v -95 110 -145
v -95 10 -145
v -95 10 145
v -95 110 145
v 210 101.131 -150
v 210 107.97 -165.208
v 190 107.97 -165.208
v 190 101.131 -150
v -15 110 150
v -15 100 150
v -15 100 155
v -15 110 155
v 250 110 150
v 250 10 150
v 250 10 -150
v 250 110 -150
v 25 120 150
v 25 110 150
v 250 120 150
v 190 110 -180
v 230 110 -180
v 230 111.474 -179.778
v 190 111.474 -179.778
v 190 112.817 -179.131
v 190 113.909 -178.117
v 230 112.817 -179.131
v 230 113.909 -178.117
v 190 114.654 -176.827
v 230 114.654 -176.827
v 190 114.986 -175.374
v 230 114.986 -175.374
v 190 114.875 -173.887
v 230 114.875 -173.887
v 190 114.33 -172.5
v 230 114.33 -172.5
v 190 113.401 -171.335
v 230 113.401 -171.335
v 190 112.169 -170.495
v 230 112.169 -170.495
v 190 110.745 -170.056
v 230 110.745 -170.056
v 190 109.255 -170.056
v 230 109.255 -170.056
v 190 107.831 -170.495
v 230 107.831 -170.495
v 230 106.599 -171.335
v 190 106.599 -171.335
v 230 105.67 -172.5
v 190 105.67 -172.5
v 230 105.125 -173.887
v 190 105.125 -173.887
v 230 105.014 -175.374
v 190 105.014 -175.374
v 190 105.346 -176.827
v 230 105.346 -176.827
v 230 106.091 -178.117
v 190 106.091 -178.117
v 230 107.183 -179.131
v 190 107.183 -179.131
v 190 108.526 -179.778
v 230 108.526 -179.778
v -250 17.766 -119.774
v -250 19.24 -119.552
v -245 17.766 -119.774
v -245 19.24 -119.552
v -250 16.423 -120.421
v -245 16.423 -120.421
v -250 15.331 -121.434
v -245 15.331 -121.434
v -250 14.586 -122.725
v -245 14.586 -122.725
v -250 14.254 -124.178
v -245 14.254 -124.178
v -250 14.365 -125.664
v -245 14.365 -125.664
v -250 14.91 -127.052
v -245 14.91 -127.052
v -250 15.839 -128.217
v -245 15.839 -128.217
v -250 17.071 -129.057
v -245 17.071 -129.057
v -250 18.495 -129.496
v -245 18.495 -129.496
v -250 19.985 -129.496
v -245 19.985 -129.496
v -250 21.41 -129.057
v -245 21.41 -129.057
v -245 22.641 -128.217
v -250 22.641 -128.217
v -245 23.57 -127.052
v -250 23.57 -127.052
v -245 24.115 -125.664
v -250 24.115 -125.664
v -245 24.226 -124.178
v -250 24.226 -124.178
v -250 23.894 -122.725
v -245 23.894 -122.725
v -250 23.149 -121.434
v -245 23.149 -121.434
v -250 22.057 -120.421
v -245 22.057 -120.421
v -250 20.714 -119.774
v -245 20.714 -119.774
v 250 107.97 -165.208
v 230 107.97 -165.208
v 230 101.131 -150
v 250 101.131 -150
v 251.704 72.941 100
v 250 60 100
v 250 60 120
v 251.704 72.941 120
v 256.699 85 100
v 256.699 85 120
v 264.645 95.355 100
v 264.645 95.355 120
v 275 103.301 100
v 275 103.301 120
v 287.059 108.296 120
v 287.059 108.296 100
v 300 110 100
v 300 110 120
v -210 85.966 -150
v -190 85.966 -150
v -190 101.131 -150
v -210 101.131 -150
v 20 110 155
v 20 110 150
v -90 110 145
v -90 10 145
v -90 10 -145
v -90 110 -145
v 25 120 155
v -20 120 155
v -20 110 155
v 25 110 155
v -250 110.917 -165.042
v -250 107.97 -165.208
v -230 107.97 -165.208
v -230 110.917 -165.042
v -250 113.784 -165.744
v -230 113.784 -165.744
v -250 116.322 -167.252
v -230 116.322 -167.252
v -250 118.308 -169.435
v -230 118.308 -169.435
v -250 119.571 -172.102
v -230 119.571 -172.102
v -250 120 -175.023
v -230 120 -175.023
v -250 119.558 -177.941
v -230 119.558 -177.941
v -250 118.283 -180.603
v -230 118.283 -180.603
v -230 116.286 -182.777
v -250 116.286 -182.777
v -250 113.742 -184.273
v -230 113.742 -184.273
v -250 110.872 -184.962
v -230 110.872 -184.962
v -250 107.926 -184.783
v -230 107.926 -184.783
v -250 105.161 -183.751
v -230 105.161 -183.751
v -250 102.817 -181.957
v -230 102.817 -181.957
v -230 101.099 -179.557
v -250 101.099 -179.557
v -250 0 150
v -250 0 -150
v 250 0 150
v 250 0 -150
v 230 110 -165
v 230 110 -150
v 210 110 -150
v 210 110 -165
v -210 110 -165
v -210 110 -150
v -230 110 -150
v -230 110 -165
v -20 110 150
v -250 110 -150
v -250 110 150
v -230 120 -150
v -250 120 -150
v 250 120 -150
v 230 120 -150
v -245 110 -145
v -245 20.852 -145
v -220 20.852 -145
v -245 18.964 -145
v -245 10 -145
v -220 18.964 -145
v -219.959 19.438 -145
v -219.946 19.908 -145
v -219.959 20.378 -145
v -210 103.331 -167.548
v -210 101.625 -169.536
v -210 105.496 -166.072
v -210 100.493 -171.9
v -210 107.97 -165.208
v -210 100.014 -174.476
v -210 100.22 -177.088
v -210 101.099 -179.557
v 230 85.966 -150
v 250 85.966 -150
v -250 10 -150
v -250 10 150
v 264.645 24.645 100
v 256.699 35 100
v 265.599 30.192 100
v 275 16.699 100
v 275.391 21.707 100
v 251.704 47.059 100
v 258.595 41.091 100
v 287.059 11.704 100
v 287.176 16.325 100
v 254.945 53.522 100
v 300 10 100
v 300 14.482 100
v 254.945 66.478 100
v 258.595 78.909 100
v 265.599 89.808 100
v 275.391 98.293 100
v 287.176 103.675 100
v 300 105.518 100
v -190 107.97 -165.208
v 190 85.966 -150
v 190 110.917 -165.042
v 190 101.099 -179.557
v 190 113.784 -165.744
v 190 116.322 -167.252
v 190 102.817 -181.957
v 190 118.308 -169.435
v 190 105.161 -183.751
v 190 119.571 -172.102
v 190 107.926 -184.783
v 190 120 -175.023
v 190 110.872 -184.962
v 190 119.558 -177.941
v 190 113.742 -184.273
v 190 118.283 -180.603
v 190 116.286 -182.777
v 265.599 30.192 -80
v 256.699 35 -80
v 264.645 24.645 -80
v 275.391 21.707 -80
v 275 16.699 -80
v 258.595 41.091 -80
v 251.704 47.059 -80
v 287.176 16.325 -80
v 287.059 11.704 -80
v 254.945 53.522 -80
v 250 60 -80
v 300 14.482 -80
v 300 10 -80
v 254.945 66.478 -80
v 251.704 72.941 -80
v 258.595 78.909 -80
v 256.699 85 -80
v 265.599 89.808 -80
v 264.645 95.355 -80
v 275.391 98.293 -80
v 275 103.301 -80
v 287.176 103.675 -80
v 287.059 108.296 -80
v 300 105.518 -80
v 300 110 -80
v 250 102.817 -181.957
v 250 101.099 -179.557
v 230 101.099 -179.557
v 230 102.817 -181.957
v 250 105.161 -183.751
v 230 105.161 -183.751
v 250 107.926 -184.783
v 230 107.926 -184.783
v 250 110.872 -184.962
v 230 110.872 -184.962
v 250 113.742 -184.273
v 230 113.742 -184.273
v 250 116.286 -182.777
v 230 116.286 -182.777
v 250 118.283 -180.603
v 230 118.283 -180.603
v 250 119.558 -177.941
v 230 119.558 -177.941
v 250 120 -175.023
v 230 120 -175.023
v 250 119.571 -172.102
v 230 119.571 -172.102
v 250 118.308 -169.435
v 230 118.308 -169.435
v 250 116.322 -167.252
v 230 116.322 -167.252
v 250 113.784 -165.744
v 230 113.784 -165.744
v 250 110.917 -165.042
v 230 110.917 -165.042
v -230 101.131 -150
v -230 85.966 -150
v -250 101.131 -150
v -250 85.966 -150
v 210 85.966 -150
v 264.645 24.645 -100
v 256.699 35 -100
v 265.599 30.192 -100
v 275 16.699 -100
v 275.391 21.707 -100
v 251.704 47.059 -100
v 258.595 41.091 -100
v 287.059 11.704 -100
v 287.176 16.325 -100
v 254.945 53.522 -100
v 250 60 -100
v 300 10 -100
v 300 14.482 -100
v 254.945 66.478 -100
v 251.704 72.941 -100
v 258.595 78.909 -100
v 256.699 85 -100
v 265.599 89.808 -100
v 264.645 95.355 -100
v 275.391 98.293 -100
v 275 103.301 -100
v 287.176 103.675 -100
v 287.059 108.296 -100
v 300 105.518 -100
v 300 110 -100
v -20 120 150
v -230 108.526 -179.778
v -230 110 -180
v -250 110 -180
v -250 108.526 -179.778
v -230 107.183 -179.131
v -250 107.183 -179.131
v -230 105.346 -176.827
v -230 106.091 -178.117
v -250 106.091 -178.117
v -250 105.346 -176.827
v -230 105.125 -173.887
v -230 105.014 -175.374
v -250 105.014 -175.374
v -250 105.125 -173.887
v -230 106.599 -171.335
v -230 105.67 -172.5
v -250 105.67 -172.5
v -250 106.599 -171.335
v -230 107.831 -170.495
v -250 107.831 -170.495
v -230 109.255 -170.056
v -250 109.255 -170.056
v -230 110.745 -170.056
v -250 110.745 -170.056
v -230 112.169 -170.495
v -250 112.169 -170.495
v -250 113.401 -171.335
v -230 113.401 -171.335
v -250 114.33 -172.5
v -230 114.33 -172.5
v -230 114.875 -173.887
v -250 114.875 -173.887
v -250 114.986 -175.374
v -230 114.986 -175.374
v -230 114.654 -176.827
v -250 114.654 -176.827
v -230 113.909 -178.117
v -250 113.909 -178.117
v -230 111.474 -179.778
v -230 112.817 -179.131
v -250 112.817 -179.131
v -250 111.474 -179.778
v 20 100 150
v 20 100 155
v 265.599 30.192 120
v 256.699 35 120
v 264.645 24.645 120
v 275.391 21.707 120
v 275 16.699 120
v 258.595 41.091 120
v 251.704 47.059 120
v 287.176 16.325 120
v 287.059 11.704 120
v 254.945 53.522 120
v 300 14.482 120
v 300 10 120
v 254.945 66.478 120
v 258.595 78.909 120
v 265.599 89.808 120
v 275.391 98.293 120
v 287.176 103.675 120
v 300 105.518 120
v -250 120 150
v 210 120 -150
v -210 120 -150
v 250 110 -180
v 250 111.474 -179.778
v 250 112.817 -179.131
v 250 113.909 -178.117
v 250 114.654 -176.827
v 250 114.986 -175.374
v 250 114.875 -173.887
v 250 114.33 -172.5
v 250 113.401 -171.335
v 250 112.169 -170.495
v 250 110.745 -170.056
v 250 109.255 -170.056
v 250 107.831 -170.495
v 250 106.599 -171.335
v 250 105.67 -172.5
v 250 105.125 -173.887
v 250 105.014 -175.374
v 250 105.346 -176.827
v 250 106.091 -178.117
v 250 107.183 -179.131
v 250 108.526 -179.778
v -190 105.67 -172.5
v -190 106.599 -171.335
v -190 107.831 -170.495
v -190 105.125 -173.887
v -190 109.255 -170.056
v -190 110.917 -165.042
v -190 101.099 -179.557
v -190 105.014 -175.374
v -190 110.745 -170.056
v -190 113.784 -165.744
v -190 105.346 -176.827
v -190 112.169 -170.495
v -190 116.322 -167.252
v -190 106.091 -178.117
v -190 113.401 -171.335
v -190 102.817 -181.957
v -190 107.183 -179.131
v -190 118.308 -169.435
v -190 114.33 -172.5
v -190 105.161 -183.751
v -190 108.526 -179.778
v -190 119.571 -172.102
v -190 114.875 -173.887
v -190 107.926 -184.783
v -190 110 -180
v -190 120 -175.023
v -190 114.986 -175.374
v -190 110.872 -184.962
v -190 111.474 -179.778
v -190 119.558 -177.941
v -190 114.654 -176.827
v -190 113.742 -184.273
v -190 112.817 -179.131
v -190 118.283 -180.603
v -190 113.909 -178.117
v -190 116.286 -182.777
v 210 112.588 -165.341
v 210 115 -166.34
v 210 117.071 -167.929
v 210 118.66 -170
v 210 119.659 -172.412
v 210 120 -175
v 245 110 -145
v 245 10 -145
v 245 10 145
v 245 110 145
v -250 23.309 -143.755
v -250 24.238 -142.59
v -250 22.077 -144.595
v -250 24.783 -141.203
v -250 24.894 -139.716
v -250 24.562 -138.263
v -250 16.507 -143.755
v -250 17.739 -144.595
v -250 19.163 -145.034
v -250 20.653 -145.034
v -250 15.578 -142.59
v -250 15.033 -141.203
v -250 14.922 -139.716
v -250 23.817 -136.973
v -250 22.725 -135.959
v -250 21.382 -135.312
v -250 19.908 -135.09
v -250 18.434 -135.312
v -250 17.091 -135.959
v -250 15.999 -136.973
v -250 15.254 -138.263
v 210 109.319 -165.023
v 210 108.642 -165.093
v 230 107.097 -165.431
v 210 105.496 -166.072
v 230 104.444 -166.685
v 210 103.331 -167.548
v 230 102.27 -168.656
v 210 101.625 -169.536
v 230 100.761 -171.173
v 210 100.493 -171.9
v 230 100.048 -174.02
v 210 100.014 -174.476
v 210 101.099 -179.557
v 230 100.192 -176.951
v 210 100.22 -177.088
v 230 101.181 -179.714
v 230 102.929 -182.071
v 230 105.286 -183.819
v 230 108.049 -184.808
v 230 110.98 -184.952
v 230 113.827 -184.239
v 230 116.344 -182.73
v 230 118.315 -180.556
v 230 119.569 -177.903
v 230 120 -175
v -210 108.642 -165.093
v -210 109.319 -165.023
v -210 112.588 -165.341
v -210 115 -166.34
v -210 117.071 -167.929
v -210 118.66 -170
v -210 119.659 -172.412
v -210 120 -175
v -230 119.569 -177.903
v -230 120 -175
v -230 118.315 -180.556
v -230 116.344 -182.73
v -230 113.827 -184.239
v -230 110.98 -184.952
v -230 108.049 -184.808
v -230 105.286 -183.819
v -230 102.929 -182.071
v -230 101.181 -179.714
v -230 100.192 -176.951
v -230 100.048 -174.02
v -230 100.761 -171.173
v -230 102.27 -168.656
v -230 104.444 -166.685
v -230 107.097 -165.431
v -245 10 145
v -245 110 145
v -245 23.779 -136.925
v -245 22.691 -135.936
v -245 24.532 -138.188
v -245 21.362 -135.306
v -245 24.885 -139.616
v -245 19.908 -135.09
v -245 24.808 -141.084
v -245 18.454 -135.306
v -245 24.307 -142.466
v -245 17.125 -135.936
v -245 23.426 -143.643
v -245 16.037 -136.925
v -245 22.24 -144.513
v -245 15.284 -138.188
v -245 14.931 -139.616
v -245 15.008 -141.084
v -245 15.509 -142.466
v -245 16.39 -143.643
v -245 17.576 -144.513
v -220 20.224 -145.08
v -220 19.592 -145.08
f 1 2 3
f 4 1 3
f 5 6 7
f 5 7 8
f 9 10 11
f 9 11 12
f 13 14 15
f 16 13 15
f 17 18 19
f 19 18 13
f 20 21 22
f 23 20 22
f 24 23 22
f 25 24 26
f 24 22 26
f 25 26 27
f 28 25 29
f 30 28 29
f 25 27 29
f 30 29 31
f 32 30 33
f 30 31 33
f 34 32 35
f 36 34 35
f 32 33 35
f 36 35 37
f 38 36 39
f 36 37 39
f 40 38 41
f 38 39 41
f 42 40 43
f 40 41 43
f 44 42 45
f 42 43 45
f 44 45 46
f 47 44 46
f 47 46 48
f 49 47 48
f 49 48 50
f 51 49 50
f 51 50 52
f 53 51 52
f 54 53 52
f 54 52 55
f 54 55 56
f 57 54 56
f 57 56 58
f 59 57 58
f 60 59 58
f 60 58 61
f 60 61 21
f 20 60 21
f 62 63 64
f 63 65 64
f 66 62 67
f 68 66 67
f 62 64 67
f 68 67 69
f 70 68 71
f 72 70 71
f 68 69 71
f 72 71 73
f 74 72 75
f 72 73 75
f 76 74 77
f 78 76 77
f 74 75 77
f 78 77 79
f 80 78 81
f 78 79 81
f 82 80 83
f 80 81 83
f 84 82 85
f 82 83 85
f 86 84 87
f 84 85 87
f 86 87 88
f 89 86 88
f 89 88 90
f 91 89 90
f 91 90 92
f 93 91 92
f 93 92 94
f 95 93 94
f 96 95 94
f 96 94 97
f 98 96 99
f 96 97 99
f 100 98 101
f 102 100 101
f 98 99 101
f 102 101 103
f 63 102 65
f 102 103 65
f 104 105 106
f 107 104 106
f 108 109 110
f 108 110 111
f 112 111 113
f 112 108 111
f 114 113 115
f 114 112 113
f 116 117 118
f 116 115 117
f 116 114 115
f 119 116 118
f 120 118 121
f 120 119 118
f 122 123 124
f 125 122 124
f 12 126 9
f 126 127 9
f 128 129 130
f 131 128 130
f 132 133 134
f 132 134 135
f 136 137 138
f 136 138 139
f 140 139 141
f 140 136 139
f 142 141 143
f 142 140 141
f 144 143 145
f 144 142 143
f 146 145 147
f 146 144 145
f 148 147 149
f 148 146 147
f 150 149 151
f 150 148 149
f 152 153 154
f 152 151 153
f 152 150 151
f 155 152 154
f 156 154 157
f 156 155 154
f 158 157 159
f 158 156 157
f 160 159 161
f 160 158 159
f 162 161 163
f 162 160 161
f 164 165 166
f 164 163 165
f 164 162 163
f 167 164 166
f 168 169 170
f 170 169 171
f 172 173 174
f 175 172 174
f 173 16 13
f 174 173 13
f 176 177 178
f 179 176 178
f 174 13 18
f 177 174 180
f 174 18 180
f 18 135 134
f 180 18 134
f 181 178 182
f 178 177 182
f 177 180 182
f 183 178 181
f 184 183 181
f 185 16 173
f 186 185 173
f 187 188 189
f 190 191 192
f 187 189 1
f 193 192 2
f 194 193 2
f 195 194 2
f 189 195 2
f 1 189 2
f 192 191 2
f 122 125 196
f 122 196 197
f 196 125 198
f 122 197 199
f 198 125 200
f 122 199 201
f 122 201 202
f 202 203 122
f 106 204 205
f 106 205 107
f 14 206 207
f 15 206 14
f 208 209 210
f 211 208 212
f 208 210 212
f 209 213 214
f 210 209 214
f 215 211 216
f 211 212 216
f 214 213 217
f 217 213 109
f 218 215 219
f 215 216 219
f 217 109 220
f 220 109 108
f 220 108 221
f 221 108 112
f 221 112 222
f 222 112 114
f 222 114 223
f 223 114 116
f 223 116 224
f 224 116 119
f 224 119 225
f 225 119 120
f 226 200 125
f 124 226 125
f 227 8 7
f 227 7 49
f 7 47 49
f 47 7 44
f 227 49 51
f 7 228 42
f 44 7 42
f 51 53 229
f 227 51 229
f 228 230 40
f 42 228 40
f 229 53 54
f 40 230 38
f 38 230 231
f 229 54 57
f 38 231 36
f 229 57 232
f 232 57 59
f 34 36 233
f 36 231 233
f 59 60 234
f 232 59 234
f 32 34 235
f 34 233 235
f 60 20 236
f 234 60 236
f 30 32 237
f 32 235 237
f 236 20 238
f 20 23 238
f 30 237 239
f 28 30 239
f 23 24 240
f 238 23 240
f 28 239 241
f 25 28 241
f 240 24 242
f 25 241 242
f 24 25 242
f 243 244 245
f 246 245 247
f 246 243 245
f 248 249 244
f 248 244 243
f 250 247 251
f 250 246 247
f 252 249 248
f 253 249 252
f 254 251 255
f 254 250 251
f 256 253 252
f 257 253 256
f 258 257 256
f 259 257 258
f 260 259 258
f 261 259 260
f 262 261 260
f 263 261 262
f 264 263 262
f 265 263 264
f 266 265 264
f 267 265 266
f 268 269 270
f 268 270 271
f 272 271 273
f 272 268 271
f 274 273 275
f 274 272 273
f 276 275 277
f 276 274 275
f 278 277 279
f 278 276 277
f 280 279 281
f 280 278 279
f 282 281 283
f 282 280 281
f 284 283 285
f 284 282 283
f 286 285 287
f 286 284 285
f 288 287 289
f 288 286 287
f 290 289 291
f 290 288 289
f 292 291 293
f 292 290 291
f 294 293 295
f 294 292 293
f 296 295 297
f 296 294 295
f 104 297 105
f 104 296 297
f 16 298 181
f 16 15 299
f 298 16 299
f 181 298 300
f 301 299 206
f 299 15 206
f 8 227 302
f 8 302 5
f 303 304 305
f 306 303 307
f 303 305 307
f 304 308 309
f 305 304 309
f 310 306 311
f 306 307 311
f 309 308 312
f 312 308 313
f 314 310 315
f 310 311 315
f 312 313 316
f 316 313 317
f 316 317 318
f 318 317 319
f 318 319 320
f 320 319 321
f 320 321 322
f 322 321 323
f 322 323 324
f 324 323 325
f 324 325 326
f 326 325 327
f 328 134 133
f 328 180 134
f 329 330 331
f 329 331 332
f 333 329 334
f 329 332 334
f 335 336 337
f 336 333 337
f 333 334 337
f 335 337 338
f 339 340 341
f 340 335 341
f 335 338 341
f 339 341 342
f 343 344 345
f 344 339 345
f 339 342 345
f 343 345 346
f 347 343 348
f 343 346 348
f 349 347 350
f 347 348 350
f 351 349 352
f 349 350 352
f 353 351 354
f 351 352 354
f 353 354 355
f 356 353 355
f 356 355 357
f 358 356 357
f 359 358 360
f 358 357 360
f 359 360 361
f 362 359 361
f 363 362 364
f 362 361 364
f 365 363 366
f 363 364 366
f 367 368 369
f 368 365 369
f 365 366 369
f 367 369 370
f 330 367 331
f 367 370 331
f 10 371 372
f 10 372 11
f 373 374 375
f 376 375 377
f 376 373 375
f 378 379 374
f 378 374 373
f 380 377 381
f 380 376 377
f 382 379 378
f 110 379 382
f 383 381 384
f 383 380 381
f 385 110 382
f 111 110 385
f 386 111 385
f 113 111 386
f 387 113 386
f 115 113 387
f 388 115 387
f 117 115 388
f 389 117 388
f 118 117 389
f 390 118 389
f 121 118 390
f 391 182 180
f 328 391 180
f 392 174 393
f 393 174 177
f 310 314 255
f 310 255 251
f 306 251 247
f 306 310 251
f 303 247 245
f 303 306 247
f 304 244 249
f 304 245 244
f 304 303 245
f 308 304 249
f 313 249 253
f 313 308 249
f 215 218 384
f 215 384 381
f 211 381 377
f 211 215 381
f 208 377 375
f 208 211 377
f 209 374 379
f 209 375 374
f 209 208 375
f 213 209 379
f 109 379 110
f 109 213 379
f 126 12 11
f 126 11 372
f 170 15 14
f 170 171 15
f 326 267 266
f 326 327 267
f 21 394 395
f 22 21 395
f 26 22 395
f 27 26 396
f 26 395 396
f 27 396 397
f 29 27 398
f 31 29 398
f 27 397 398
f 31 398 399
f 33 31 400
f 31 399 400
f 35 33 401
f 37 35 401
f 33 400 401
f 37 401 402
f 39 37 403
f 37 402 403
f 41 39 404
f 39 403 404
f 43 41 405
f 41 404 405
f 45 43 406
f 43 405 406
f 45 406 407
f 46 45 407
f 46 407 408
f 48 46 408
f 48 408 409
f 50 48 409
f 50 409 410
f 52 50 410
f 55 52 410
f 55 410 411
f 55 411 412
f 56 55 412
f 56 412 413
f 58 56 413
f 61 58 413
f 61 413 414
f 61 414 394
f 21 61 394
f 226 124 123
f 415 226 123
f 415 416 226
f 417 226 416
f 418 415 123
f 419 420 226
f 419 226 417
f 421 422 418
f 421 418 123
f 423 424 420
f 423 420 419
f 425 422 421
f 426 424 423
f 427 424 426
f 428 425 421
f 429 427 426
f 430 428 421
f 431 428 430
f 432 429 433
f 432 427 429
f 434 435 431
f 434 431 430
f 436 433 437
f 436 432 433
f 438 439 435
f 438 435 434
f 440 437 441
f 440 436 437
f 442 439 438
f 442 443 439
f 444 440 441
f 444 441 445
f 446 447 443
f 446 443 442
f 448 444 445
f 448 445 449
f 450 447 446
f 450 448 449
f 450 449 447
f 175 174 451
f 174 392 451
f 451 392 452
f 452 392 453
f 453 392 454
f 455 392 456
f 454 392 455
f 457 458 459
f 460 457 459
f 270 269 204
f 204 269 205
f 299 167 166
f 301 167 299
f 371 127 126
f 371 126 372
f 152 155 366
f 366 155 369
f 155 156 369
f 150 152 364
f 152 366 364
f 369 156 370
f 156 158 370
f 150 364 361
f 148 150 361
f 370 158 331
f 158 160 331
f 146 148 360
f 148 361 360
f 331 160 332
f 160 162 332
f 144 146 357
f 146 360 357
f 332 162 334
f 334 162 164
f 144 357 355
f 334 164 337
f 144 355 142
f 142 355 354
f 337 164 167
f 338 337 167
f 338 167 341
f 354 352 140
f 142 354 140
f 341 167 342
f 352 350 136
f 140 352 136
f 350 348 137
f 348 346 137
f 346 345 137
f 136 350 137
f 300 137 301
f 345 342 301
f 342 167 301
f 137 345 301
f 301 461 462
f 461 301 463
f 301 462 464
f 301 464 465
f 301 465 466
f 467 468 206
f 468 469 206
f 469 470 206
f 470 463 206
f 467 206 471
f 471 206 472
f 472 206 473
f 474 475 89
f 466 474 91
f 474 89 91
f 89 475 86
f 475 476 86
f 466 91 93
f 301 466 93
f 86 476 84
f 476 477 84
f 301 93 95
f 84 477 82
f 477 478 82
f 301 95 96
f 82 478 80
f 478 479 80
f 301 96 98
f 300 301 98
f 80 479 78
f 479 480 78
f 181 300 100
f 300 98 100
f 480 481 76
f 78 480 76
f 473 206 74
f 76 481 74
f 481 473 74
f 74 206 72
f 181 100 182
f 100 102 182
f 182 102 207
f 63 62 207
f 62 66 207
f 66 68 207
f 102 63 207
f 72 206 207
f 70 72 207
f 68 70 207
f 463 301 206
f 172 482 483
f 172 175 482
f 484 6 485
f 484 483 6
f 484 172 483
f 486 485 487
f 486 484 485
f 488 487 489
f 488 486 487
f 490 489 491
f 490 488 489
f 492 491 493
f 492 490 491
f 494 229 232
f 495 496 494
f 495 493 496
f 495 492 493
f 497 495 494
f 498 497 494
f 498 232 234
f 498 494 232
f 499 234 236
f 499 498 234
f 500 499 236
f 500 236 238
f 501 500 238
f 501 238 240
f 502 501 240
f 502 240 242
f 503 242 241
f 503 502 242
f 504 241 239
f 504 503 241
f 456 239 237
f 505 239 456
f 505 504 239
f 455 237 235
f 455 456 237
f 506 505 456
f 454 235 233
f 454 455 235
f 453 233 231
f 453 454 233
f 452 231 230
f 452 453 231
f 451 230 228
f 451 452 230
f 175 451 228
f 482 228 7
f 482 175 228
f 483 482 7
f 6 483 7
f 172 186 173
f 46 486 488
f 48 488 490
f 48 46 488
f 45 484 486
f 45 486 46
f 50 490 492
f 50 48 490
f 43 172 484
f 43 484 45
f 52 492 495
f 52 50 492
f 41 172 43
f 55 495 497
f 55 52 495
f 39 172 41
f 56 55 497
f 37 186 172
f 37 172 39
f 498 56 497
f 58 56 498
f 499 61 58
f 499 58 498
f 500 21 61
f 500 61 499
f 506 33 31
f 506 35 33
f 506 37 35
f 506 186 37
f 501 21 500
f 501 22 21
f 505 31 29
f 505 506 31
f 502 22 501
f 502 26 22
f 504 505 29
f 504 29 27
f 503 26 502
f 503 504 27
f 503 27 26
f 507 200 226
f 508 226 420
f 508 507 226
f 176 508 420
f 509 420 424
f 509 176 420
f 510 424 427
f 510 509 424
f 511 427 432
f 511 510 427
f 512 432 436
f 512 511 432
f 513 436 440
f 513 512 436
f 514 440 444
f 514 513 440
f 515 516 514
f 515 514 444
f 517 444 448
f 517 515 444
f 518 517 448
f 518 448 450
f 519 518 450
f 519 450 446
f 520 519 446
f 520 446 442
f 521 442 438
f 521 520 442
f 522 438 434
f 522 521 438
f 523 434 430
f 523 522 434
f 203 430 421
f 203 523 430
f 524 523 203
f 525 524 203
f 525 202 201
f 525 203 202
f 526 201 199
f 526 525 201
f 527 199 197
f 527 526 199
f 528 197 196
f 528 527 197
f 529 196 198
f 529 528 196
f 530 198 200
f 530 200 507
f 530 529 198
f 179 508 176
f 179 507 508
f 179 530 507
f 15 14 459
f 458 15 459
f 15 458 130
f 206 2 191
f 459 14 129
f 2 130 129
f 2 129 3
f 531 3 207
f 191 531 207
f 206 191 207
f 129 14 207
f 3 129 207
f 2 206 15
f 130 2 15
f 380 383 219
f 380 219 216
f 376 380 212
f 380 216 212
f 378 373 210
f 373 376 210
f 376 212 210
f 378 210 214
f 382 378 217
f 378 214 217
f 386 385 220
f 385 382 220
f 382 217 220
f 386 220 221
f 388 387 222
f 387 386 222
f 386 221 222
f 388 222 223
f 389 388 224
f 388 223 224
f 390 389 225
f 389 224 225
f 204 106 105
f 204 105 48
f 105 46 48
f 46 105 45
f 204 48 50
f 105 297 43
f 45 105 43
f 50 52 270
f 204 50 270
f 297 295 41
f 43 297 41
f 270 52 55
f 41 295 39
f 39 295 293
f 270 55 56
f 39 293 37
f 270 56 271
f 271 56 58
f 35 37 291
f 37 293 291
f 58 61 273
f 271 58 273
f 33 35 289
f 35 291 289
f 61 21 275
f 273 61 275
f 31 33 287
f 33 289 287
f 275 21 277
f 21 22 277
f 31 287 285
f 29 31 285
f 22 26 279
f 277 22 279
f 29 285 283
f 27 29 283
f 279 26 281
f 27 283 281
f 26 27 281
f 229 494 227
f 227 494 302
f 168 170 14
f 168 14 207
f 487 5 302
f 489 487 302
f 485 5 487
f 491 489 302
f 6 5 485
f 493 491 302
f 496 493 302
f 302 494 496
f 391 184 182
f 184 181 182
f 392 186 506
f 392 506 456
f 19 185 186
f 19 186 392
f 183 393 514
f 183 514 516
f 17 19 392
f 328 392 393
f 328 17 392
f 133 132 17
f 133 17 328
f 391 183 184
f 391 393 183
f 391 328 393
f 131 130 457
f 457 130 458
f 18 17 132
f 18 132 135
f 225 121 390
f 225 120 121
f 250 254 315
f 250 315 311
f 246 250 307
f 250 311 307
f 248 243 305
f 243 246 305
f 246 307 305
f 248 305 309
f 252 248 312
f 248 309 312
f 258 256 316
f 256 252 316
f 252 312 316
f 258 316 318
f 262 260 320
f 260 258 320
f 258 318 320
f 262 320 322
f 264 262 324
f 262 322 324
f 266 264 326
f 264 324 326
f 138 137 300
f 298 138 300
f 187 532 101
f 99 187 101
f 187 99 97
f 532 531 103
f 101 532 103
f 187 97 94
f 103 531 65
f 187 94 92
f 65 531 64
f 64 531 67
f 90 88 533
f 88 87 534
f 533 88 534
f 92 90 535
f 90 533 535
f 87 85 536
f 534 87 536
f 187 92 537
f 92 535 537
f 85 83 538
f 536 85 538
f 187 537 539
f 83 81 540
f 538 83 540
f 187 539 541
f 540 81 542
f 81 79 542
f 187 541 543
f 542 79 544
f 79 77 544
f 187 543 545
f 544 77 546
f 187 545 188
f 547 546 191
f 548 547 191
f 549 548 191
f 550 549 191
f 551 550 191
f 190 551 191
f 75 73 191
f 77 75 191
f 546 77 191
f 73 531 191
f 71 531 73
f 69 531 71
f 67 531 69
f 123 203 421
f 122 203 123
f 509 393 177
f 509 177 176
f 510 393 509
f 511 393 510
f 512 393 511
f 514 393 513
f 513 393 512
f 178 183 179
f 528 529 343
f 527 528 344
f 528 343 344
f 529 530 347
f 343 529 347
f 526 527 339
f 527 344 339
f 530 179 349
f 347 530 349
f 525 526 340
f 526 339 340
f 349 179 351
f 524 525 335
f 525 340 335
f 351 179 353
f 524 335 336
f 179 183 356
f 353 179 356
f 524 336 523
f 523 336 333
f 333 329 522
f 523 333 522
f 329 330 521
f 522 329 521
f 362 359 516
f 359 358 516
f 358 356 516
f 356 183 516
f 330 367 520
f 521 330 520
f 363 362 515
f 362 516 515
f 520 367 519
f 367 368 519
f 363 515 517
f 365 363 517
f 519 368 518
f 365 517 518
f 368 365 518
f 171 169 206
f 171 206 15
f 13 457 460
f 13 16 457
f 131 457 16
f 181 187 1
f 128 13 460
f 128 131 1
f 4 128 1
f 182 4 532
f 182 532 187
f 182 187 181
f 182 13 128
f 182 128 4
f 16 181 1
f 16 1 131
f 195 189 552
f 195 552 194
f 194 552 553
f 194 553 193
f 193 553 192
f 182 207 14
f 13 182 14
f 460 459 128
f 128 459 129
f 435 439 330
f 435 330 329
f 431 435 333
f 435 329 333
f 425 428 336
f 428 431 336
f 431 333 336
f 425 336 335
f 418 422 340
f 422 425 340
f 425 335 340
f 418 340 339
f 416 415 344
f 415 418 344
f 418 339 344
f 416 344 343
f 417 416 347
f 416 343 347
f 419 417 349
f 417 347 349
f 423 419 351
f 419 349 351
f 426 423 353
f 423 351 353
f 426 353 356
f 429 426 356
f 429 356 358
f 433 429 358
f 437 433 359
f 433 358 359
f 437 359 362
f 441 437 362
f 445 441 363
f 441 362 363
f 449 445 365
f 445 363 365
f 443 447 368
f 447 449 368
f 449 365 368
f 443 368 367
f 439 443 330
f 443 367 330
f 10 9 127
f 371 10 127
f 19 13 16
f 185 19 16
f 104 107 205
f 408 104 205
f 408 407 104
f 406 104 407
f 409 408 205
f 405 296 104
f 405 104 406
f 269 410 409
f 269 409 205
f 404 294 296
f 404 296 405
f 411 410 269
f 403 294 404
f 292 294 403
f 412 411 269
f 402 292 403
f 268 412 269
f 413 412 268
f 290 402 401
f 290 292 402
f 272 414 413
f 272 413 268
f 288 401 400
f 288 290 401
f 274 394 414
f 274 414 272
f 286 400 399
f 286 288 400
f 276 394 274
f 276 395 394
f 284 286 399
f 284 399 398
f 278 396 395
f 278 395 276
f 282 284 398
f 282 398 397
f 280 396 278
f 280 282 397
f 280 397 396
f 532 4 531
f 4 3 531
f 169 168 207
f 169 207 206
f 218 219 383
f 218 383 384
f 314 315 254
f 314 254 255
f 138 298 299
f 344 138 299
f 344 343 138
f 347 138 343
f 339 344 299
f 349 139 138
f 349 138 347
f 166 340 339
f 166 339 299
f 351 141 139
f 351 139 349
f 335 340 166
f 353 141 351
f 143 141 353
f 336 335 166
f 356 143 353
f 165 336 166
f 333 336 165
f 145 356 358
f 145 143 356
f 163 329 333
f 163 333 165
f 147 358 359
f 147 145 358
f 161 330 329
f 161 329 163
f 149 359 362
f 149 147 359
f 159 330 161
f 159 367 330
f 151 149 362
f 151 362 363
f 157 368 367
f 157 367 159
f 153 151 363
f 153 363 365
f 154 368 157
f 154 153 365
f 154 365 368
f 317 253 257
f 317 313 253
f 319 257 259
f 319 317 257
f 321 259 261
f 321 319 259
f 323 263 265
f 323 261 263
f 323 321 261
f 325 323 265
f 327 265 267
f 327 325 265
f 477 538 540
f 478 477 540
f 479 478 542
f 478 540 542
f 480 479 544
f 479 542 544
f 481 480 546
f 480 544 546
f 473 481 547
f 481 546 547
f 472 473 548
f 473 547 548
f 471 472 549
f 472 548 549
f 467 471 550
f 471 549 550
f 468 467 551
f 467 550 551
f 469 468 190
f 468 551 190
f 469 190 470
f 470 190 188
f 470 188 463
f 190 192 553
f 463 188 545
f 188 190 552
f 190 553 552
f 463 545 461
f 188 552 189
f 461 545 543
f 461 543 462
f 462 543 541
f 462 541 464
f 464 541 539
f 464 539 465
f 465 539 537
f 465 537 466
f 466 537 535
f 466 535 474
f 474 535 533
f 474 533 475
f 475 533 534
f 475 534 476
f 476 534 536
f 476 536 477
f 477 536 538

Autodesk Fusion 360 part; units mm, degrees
sketch "Sketch1" plane through (0, 0, 0) normal (0, 1, 0) x (1, 0, 0)
  line L0 (250, -150) -> (-250, -150)
  line L1 (-250, -150) -> (-250, 150)
  line L2 (-250, 150) -> (250, 150)
  line L3 (250, 150) -> (250, -150)
  line L4 (250, -150) -> (-250, 150) construction
  line L5 (-250, -150) -> (250, 150) construction
  dimension "d1" = 500
  dimension "d2" = 300
extrude "Extrude1" add sketch "Sketch1" along normal blind 10 makes body 1
sketch "Sketch2" plane through (0, 10, 0) normal (0, 1, 0) x (-1, 0, 0)
  line L0 (-250, -150) -> (250, -150)
  line L1 (250, -150) -> (250, 150)
  line L2 (250, 150) -> (-250, 150)
  line L3 (-250, 150) -> (-250, -150)
  line L4 (-250, 150) -> (250, 150)
  line L5 (250, 150) -> (250, -150)
  line L6 (250, -150) -> (-250, -150)
  line L7 (-250, -150) -> (-250, 150)
  line L8 (250, -150) -> (-250, -150)
  line L9 (-250, -150) -> (-250, 150)
  line L10 (-250, 150) -> (250, 150)
  line L11 (250, 150) -> (250, -150)
  line L12 (250, -150) -> (-250, 150) construction
  line L13 (-250, -150) -> (250, 150) construction
  line L14 (-245, -145) -> (-245, 145)
  line L15 (245, 145) -> (245, -145)
  line L16 (90, 145) -> (90, -145)
  line L17 (95, -145) -> (95, 145)
  line L18 (95, 145) -> (90, -145) construction
  line L19 (90, 145) -> (95, -145) construction
  line L20 (-245, 145) -> (90, 145)
  line L21 (95, 145) -> (245, 145)
  line L22 (245, -145) -> (95, -145)
  line L23 (90, -145) -> (-245, -145)
  point P0 (92.5, 0)
  dimension "d6" = 5
  dimension "d7" = 150
extrude "Extrude1'" add sketch "Sketch2" along normal blind 100 separate body makes body 2 in component "Component"
sketch "Sketch3" plane through (0, 110, 0) normal (0, 1, 0) x (-1, 0, 0)
  line L0 (245, 145) -> (245, -145)
  line L1 (245, -145) -> (95, -145)
  line L2 (95, -145) -> (95, 145)
  line L3 (95, 145) -> (245, 145)
  line L4 (90, 145) -> (90, -145)
  line L5 (90, -145) -> (-245, -145)
  line L6 (-245, -145) -> (-245, 145)
  line L7 (-245, 145) -> (90, 145)
  line L8 (250, 150) -> (-250, 150)
  line L9 (-250, 150) -> (-250, -150)
  line L10 (-250, -150) -> (250, -150)
  line L11 (250, -150) -> (250, 150)
  line L12 (-250, 150) -> (250, 150)
  line L13 (250, 150) -> (250, -150)
  line L14 (250, -150) -> (-250, -150)
  line L15 (-250, -150) -> (-250, 150)
extrude "Extrude2" add sketch "Sketch3" along normal blind 10 separate body contours L0 L1 L2 L3 | L4 L5 L6 L7 | L8 L9 L10 L11 L12 L13 L14 L15 makes body 3
sketch "Sketch4" plane through (250, 0, 0) normal (1, 0, 0) x (0, 0, -1)
  line L0 (-150, 10) -> (150, 10)
  line L1 (150, 10) -> (150, 110)
  line L2 (150, 110) -> (-150, 110)
  line L3 (-150, 110) -> (-150, 10)
  line L4 (175, 125) -> (175, 75) construction
  circle A0 centre (175, 110) radius 10
  circle A1 centre (175, 110) radius 5
  line L5 (150, 110) -> (175, 110) construction
  line L6 (179.5571, 101.0987) -> (150, 85.9665)
  line L7 (150, 120) -> (175, 120)
  line L8 (165.2081, 107.9704) -> (150, 101.1307)
  line L9 (165, 110) -> (150, 110)
  line L10 (150, 120) -> (150, 110)
  dimension "d12" = 25
extrude "Extrude1''" add sketch "Sketch4" against normal blind 20 separate body contours L1 A0 L6 L8 | A0 makes body 4 in component "Component'"
extrude "Extrude3" add sketch "Sketch4" against normal blind 20 from surface at -20 contours A0 L7 L9 L10 | A0 bodies 3
extrude "Extrude4" add sketch "Sketch4" against normal blind 20 from surface at -40 contours L1 A0 L6 L8 | A0 bodies 3
extrude "Extrude2'" add sketch "Sketch4" along normal blind 20 from surface at -500 contours L1 A0 L6 L8 | A0 bodies 2 in component "Component"
extrude "Extrude5" add sketch "Sketch4" along normal blind 20 from surface at -480 contours A0 L7 L9 L10 | A0 bodies 3
extrude "Extrude6" add sketch "Sketch4" along normal blind 20 from surface at -460 contours L1 A0 L6 L8 | A0 bodies 3
sketch "Sketch5" plane through (0, 0, 150) normal (0, 0, 1) x (1, 0, 0)
  line L0 (-250, 110) -> (250, 110)
  line L1 (250, 110) -> (250, 120)
  line L2 (250, 120) -> (-250, 120)
  line L3 (-250, 120) -> (-250, 110)
  line L4 (-20, 120) -> (25, 120)
  line L5 (25, 120) -> (25, 100)
  line L6 (25, 100) -> (-20, 100)
  line L7 (-20, 100) -> (-20, 120)
extrude "Extrude7" add sketch "Sketch5" along normal blind 5 contours L0 L2 L4 L5 L7 bodies 3
sketch "Sketch6" plane through (0, 0, 150) normal (0, 0, 1) x (1, 0, 0)
  line L0 (-250, 10) -> (250, 10)
  line L1 (250, 10) -> (250, 110)
  line L2 (250, 110) -> (-250, 110)
  line L3 (-250, 110) -> (-250, 10)
  line L4 (-15, 110) -> (20, 110)
  line L5 (20, 110) -> (20, 100)
  line L6 (20, 100) -> (-15, 100)
  line L7 (-15, 100) -> (-15, 110)
extrude "Extrude1'''" add sketch "Sketch6" along normal blind 5 separate body contours L2 L4 L5 L6 L7 makes body 5 in component "Component''"
sketch "Sketch7" plane through (-250, 0, 0) normal (-1, 0, 0) x (0, 0, 1)
  circle A0 centre (-175, 110) radius 5
  line L0 (-150, 10) -> (150, 10)
  line L1 (150, 10) -> (150, 110)
  line L2 (150, 110) -> (-150, 110)
  line L3 (-150, 110) -> (-150, 101.1307)
  line L4 (-150, 101.1307) -> (-165.2081, 107.9704)
  arc A1 (-165.2081, 107.9704) -> (-179.5571, 101.0987) centre (-175, 110) ccw
  line L5 (-179.5571, 101.0987) -> (-150, 85.9665)
  line L6 (-150, 85.9665) -> (-150, 10)
hole "Hole1" at (-250, 19.908, -140.09) direction (1, 0, 0) diameter 10 depth 30 tip angle 118 bodies 2 in component "Component"
hole "Hole2" at (-250, 19.2401, -124.5518) direction (1, 0, 0) diameter 10 depth 40 tip angle 118 bodies 2 in component "Component"
sketch "Sketch8" plane through (0, 0, 150) normal (0, 0, 1) x (1, 0, 0)
  line L0 (-250, 10) -> (250, 10)
  line L1 (250, 10) -> (250, 110)
  line L2 (250, 110) -> (-250, 110)
  line L3 (-250, 110) -> (-250, 10)
  line L4 (250, 60) -> (350, 60) construction
  line L5 (300, 130) -> (300, 0) construction
  arc A0 (300, 110) -> (300, 10) centre (300, 60) ccw
  arc A1 (300, 105.5184) -> (300, 14.4816) centre (300, 60) ccw
  line L6 (300, 110) -> (300, 105.5184)
  line L7 (300, 14.4816) -> (300, 10)
  line L8 (300, 14.4816) -> (300, 10) construction
extrude "Extrude8" add sketch "Sketch8" along normal blind 20 from surface at -50 separate body contours A0 A1 L6 L7 makes body 6
extrude "Extrude9" add sketch "Sketch8" along normal blind 20 from surface at -250 separate body contours A0 A1 L6 L7 makes body 7
component "Component" placed x (1, 0, 0) y (0, 1, 0) z (0, 0, 1) at (0, 0, 0)
component "Component'" placed x (1, 0, 0) y (0, 1, 0) z (0, 0, 1) at (0, 0, 0)
component "Component''" placed x (1, 0, 0) y (0, 1, 0) z (0, 0, 1) at (0, 0, 0)
